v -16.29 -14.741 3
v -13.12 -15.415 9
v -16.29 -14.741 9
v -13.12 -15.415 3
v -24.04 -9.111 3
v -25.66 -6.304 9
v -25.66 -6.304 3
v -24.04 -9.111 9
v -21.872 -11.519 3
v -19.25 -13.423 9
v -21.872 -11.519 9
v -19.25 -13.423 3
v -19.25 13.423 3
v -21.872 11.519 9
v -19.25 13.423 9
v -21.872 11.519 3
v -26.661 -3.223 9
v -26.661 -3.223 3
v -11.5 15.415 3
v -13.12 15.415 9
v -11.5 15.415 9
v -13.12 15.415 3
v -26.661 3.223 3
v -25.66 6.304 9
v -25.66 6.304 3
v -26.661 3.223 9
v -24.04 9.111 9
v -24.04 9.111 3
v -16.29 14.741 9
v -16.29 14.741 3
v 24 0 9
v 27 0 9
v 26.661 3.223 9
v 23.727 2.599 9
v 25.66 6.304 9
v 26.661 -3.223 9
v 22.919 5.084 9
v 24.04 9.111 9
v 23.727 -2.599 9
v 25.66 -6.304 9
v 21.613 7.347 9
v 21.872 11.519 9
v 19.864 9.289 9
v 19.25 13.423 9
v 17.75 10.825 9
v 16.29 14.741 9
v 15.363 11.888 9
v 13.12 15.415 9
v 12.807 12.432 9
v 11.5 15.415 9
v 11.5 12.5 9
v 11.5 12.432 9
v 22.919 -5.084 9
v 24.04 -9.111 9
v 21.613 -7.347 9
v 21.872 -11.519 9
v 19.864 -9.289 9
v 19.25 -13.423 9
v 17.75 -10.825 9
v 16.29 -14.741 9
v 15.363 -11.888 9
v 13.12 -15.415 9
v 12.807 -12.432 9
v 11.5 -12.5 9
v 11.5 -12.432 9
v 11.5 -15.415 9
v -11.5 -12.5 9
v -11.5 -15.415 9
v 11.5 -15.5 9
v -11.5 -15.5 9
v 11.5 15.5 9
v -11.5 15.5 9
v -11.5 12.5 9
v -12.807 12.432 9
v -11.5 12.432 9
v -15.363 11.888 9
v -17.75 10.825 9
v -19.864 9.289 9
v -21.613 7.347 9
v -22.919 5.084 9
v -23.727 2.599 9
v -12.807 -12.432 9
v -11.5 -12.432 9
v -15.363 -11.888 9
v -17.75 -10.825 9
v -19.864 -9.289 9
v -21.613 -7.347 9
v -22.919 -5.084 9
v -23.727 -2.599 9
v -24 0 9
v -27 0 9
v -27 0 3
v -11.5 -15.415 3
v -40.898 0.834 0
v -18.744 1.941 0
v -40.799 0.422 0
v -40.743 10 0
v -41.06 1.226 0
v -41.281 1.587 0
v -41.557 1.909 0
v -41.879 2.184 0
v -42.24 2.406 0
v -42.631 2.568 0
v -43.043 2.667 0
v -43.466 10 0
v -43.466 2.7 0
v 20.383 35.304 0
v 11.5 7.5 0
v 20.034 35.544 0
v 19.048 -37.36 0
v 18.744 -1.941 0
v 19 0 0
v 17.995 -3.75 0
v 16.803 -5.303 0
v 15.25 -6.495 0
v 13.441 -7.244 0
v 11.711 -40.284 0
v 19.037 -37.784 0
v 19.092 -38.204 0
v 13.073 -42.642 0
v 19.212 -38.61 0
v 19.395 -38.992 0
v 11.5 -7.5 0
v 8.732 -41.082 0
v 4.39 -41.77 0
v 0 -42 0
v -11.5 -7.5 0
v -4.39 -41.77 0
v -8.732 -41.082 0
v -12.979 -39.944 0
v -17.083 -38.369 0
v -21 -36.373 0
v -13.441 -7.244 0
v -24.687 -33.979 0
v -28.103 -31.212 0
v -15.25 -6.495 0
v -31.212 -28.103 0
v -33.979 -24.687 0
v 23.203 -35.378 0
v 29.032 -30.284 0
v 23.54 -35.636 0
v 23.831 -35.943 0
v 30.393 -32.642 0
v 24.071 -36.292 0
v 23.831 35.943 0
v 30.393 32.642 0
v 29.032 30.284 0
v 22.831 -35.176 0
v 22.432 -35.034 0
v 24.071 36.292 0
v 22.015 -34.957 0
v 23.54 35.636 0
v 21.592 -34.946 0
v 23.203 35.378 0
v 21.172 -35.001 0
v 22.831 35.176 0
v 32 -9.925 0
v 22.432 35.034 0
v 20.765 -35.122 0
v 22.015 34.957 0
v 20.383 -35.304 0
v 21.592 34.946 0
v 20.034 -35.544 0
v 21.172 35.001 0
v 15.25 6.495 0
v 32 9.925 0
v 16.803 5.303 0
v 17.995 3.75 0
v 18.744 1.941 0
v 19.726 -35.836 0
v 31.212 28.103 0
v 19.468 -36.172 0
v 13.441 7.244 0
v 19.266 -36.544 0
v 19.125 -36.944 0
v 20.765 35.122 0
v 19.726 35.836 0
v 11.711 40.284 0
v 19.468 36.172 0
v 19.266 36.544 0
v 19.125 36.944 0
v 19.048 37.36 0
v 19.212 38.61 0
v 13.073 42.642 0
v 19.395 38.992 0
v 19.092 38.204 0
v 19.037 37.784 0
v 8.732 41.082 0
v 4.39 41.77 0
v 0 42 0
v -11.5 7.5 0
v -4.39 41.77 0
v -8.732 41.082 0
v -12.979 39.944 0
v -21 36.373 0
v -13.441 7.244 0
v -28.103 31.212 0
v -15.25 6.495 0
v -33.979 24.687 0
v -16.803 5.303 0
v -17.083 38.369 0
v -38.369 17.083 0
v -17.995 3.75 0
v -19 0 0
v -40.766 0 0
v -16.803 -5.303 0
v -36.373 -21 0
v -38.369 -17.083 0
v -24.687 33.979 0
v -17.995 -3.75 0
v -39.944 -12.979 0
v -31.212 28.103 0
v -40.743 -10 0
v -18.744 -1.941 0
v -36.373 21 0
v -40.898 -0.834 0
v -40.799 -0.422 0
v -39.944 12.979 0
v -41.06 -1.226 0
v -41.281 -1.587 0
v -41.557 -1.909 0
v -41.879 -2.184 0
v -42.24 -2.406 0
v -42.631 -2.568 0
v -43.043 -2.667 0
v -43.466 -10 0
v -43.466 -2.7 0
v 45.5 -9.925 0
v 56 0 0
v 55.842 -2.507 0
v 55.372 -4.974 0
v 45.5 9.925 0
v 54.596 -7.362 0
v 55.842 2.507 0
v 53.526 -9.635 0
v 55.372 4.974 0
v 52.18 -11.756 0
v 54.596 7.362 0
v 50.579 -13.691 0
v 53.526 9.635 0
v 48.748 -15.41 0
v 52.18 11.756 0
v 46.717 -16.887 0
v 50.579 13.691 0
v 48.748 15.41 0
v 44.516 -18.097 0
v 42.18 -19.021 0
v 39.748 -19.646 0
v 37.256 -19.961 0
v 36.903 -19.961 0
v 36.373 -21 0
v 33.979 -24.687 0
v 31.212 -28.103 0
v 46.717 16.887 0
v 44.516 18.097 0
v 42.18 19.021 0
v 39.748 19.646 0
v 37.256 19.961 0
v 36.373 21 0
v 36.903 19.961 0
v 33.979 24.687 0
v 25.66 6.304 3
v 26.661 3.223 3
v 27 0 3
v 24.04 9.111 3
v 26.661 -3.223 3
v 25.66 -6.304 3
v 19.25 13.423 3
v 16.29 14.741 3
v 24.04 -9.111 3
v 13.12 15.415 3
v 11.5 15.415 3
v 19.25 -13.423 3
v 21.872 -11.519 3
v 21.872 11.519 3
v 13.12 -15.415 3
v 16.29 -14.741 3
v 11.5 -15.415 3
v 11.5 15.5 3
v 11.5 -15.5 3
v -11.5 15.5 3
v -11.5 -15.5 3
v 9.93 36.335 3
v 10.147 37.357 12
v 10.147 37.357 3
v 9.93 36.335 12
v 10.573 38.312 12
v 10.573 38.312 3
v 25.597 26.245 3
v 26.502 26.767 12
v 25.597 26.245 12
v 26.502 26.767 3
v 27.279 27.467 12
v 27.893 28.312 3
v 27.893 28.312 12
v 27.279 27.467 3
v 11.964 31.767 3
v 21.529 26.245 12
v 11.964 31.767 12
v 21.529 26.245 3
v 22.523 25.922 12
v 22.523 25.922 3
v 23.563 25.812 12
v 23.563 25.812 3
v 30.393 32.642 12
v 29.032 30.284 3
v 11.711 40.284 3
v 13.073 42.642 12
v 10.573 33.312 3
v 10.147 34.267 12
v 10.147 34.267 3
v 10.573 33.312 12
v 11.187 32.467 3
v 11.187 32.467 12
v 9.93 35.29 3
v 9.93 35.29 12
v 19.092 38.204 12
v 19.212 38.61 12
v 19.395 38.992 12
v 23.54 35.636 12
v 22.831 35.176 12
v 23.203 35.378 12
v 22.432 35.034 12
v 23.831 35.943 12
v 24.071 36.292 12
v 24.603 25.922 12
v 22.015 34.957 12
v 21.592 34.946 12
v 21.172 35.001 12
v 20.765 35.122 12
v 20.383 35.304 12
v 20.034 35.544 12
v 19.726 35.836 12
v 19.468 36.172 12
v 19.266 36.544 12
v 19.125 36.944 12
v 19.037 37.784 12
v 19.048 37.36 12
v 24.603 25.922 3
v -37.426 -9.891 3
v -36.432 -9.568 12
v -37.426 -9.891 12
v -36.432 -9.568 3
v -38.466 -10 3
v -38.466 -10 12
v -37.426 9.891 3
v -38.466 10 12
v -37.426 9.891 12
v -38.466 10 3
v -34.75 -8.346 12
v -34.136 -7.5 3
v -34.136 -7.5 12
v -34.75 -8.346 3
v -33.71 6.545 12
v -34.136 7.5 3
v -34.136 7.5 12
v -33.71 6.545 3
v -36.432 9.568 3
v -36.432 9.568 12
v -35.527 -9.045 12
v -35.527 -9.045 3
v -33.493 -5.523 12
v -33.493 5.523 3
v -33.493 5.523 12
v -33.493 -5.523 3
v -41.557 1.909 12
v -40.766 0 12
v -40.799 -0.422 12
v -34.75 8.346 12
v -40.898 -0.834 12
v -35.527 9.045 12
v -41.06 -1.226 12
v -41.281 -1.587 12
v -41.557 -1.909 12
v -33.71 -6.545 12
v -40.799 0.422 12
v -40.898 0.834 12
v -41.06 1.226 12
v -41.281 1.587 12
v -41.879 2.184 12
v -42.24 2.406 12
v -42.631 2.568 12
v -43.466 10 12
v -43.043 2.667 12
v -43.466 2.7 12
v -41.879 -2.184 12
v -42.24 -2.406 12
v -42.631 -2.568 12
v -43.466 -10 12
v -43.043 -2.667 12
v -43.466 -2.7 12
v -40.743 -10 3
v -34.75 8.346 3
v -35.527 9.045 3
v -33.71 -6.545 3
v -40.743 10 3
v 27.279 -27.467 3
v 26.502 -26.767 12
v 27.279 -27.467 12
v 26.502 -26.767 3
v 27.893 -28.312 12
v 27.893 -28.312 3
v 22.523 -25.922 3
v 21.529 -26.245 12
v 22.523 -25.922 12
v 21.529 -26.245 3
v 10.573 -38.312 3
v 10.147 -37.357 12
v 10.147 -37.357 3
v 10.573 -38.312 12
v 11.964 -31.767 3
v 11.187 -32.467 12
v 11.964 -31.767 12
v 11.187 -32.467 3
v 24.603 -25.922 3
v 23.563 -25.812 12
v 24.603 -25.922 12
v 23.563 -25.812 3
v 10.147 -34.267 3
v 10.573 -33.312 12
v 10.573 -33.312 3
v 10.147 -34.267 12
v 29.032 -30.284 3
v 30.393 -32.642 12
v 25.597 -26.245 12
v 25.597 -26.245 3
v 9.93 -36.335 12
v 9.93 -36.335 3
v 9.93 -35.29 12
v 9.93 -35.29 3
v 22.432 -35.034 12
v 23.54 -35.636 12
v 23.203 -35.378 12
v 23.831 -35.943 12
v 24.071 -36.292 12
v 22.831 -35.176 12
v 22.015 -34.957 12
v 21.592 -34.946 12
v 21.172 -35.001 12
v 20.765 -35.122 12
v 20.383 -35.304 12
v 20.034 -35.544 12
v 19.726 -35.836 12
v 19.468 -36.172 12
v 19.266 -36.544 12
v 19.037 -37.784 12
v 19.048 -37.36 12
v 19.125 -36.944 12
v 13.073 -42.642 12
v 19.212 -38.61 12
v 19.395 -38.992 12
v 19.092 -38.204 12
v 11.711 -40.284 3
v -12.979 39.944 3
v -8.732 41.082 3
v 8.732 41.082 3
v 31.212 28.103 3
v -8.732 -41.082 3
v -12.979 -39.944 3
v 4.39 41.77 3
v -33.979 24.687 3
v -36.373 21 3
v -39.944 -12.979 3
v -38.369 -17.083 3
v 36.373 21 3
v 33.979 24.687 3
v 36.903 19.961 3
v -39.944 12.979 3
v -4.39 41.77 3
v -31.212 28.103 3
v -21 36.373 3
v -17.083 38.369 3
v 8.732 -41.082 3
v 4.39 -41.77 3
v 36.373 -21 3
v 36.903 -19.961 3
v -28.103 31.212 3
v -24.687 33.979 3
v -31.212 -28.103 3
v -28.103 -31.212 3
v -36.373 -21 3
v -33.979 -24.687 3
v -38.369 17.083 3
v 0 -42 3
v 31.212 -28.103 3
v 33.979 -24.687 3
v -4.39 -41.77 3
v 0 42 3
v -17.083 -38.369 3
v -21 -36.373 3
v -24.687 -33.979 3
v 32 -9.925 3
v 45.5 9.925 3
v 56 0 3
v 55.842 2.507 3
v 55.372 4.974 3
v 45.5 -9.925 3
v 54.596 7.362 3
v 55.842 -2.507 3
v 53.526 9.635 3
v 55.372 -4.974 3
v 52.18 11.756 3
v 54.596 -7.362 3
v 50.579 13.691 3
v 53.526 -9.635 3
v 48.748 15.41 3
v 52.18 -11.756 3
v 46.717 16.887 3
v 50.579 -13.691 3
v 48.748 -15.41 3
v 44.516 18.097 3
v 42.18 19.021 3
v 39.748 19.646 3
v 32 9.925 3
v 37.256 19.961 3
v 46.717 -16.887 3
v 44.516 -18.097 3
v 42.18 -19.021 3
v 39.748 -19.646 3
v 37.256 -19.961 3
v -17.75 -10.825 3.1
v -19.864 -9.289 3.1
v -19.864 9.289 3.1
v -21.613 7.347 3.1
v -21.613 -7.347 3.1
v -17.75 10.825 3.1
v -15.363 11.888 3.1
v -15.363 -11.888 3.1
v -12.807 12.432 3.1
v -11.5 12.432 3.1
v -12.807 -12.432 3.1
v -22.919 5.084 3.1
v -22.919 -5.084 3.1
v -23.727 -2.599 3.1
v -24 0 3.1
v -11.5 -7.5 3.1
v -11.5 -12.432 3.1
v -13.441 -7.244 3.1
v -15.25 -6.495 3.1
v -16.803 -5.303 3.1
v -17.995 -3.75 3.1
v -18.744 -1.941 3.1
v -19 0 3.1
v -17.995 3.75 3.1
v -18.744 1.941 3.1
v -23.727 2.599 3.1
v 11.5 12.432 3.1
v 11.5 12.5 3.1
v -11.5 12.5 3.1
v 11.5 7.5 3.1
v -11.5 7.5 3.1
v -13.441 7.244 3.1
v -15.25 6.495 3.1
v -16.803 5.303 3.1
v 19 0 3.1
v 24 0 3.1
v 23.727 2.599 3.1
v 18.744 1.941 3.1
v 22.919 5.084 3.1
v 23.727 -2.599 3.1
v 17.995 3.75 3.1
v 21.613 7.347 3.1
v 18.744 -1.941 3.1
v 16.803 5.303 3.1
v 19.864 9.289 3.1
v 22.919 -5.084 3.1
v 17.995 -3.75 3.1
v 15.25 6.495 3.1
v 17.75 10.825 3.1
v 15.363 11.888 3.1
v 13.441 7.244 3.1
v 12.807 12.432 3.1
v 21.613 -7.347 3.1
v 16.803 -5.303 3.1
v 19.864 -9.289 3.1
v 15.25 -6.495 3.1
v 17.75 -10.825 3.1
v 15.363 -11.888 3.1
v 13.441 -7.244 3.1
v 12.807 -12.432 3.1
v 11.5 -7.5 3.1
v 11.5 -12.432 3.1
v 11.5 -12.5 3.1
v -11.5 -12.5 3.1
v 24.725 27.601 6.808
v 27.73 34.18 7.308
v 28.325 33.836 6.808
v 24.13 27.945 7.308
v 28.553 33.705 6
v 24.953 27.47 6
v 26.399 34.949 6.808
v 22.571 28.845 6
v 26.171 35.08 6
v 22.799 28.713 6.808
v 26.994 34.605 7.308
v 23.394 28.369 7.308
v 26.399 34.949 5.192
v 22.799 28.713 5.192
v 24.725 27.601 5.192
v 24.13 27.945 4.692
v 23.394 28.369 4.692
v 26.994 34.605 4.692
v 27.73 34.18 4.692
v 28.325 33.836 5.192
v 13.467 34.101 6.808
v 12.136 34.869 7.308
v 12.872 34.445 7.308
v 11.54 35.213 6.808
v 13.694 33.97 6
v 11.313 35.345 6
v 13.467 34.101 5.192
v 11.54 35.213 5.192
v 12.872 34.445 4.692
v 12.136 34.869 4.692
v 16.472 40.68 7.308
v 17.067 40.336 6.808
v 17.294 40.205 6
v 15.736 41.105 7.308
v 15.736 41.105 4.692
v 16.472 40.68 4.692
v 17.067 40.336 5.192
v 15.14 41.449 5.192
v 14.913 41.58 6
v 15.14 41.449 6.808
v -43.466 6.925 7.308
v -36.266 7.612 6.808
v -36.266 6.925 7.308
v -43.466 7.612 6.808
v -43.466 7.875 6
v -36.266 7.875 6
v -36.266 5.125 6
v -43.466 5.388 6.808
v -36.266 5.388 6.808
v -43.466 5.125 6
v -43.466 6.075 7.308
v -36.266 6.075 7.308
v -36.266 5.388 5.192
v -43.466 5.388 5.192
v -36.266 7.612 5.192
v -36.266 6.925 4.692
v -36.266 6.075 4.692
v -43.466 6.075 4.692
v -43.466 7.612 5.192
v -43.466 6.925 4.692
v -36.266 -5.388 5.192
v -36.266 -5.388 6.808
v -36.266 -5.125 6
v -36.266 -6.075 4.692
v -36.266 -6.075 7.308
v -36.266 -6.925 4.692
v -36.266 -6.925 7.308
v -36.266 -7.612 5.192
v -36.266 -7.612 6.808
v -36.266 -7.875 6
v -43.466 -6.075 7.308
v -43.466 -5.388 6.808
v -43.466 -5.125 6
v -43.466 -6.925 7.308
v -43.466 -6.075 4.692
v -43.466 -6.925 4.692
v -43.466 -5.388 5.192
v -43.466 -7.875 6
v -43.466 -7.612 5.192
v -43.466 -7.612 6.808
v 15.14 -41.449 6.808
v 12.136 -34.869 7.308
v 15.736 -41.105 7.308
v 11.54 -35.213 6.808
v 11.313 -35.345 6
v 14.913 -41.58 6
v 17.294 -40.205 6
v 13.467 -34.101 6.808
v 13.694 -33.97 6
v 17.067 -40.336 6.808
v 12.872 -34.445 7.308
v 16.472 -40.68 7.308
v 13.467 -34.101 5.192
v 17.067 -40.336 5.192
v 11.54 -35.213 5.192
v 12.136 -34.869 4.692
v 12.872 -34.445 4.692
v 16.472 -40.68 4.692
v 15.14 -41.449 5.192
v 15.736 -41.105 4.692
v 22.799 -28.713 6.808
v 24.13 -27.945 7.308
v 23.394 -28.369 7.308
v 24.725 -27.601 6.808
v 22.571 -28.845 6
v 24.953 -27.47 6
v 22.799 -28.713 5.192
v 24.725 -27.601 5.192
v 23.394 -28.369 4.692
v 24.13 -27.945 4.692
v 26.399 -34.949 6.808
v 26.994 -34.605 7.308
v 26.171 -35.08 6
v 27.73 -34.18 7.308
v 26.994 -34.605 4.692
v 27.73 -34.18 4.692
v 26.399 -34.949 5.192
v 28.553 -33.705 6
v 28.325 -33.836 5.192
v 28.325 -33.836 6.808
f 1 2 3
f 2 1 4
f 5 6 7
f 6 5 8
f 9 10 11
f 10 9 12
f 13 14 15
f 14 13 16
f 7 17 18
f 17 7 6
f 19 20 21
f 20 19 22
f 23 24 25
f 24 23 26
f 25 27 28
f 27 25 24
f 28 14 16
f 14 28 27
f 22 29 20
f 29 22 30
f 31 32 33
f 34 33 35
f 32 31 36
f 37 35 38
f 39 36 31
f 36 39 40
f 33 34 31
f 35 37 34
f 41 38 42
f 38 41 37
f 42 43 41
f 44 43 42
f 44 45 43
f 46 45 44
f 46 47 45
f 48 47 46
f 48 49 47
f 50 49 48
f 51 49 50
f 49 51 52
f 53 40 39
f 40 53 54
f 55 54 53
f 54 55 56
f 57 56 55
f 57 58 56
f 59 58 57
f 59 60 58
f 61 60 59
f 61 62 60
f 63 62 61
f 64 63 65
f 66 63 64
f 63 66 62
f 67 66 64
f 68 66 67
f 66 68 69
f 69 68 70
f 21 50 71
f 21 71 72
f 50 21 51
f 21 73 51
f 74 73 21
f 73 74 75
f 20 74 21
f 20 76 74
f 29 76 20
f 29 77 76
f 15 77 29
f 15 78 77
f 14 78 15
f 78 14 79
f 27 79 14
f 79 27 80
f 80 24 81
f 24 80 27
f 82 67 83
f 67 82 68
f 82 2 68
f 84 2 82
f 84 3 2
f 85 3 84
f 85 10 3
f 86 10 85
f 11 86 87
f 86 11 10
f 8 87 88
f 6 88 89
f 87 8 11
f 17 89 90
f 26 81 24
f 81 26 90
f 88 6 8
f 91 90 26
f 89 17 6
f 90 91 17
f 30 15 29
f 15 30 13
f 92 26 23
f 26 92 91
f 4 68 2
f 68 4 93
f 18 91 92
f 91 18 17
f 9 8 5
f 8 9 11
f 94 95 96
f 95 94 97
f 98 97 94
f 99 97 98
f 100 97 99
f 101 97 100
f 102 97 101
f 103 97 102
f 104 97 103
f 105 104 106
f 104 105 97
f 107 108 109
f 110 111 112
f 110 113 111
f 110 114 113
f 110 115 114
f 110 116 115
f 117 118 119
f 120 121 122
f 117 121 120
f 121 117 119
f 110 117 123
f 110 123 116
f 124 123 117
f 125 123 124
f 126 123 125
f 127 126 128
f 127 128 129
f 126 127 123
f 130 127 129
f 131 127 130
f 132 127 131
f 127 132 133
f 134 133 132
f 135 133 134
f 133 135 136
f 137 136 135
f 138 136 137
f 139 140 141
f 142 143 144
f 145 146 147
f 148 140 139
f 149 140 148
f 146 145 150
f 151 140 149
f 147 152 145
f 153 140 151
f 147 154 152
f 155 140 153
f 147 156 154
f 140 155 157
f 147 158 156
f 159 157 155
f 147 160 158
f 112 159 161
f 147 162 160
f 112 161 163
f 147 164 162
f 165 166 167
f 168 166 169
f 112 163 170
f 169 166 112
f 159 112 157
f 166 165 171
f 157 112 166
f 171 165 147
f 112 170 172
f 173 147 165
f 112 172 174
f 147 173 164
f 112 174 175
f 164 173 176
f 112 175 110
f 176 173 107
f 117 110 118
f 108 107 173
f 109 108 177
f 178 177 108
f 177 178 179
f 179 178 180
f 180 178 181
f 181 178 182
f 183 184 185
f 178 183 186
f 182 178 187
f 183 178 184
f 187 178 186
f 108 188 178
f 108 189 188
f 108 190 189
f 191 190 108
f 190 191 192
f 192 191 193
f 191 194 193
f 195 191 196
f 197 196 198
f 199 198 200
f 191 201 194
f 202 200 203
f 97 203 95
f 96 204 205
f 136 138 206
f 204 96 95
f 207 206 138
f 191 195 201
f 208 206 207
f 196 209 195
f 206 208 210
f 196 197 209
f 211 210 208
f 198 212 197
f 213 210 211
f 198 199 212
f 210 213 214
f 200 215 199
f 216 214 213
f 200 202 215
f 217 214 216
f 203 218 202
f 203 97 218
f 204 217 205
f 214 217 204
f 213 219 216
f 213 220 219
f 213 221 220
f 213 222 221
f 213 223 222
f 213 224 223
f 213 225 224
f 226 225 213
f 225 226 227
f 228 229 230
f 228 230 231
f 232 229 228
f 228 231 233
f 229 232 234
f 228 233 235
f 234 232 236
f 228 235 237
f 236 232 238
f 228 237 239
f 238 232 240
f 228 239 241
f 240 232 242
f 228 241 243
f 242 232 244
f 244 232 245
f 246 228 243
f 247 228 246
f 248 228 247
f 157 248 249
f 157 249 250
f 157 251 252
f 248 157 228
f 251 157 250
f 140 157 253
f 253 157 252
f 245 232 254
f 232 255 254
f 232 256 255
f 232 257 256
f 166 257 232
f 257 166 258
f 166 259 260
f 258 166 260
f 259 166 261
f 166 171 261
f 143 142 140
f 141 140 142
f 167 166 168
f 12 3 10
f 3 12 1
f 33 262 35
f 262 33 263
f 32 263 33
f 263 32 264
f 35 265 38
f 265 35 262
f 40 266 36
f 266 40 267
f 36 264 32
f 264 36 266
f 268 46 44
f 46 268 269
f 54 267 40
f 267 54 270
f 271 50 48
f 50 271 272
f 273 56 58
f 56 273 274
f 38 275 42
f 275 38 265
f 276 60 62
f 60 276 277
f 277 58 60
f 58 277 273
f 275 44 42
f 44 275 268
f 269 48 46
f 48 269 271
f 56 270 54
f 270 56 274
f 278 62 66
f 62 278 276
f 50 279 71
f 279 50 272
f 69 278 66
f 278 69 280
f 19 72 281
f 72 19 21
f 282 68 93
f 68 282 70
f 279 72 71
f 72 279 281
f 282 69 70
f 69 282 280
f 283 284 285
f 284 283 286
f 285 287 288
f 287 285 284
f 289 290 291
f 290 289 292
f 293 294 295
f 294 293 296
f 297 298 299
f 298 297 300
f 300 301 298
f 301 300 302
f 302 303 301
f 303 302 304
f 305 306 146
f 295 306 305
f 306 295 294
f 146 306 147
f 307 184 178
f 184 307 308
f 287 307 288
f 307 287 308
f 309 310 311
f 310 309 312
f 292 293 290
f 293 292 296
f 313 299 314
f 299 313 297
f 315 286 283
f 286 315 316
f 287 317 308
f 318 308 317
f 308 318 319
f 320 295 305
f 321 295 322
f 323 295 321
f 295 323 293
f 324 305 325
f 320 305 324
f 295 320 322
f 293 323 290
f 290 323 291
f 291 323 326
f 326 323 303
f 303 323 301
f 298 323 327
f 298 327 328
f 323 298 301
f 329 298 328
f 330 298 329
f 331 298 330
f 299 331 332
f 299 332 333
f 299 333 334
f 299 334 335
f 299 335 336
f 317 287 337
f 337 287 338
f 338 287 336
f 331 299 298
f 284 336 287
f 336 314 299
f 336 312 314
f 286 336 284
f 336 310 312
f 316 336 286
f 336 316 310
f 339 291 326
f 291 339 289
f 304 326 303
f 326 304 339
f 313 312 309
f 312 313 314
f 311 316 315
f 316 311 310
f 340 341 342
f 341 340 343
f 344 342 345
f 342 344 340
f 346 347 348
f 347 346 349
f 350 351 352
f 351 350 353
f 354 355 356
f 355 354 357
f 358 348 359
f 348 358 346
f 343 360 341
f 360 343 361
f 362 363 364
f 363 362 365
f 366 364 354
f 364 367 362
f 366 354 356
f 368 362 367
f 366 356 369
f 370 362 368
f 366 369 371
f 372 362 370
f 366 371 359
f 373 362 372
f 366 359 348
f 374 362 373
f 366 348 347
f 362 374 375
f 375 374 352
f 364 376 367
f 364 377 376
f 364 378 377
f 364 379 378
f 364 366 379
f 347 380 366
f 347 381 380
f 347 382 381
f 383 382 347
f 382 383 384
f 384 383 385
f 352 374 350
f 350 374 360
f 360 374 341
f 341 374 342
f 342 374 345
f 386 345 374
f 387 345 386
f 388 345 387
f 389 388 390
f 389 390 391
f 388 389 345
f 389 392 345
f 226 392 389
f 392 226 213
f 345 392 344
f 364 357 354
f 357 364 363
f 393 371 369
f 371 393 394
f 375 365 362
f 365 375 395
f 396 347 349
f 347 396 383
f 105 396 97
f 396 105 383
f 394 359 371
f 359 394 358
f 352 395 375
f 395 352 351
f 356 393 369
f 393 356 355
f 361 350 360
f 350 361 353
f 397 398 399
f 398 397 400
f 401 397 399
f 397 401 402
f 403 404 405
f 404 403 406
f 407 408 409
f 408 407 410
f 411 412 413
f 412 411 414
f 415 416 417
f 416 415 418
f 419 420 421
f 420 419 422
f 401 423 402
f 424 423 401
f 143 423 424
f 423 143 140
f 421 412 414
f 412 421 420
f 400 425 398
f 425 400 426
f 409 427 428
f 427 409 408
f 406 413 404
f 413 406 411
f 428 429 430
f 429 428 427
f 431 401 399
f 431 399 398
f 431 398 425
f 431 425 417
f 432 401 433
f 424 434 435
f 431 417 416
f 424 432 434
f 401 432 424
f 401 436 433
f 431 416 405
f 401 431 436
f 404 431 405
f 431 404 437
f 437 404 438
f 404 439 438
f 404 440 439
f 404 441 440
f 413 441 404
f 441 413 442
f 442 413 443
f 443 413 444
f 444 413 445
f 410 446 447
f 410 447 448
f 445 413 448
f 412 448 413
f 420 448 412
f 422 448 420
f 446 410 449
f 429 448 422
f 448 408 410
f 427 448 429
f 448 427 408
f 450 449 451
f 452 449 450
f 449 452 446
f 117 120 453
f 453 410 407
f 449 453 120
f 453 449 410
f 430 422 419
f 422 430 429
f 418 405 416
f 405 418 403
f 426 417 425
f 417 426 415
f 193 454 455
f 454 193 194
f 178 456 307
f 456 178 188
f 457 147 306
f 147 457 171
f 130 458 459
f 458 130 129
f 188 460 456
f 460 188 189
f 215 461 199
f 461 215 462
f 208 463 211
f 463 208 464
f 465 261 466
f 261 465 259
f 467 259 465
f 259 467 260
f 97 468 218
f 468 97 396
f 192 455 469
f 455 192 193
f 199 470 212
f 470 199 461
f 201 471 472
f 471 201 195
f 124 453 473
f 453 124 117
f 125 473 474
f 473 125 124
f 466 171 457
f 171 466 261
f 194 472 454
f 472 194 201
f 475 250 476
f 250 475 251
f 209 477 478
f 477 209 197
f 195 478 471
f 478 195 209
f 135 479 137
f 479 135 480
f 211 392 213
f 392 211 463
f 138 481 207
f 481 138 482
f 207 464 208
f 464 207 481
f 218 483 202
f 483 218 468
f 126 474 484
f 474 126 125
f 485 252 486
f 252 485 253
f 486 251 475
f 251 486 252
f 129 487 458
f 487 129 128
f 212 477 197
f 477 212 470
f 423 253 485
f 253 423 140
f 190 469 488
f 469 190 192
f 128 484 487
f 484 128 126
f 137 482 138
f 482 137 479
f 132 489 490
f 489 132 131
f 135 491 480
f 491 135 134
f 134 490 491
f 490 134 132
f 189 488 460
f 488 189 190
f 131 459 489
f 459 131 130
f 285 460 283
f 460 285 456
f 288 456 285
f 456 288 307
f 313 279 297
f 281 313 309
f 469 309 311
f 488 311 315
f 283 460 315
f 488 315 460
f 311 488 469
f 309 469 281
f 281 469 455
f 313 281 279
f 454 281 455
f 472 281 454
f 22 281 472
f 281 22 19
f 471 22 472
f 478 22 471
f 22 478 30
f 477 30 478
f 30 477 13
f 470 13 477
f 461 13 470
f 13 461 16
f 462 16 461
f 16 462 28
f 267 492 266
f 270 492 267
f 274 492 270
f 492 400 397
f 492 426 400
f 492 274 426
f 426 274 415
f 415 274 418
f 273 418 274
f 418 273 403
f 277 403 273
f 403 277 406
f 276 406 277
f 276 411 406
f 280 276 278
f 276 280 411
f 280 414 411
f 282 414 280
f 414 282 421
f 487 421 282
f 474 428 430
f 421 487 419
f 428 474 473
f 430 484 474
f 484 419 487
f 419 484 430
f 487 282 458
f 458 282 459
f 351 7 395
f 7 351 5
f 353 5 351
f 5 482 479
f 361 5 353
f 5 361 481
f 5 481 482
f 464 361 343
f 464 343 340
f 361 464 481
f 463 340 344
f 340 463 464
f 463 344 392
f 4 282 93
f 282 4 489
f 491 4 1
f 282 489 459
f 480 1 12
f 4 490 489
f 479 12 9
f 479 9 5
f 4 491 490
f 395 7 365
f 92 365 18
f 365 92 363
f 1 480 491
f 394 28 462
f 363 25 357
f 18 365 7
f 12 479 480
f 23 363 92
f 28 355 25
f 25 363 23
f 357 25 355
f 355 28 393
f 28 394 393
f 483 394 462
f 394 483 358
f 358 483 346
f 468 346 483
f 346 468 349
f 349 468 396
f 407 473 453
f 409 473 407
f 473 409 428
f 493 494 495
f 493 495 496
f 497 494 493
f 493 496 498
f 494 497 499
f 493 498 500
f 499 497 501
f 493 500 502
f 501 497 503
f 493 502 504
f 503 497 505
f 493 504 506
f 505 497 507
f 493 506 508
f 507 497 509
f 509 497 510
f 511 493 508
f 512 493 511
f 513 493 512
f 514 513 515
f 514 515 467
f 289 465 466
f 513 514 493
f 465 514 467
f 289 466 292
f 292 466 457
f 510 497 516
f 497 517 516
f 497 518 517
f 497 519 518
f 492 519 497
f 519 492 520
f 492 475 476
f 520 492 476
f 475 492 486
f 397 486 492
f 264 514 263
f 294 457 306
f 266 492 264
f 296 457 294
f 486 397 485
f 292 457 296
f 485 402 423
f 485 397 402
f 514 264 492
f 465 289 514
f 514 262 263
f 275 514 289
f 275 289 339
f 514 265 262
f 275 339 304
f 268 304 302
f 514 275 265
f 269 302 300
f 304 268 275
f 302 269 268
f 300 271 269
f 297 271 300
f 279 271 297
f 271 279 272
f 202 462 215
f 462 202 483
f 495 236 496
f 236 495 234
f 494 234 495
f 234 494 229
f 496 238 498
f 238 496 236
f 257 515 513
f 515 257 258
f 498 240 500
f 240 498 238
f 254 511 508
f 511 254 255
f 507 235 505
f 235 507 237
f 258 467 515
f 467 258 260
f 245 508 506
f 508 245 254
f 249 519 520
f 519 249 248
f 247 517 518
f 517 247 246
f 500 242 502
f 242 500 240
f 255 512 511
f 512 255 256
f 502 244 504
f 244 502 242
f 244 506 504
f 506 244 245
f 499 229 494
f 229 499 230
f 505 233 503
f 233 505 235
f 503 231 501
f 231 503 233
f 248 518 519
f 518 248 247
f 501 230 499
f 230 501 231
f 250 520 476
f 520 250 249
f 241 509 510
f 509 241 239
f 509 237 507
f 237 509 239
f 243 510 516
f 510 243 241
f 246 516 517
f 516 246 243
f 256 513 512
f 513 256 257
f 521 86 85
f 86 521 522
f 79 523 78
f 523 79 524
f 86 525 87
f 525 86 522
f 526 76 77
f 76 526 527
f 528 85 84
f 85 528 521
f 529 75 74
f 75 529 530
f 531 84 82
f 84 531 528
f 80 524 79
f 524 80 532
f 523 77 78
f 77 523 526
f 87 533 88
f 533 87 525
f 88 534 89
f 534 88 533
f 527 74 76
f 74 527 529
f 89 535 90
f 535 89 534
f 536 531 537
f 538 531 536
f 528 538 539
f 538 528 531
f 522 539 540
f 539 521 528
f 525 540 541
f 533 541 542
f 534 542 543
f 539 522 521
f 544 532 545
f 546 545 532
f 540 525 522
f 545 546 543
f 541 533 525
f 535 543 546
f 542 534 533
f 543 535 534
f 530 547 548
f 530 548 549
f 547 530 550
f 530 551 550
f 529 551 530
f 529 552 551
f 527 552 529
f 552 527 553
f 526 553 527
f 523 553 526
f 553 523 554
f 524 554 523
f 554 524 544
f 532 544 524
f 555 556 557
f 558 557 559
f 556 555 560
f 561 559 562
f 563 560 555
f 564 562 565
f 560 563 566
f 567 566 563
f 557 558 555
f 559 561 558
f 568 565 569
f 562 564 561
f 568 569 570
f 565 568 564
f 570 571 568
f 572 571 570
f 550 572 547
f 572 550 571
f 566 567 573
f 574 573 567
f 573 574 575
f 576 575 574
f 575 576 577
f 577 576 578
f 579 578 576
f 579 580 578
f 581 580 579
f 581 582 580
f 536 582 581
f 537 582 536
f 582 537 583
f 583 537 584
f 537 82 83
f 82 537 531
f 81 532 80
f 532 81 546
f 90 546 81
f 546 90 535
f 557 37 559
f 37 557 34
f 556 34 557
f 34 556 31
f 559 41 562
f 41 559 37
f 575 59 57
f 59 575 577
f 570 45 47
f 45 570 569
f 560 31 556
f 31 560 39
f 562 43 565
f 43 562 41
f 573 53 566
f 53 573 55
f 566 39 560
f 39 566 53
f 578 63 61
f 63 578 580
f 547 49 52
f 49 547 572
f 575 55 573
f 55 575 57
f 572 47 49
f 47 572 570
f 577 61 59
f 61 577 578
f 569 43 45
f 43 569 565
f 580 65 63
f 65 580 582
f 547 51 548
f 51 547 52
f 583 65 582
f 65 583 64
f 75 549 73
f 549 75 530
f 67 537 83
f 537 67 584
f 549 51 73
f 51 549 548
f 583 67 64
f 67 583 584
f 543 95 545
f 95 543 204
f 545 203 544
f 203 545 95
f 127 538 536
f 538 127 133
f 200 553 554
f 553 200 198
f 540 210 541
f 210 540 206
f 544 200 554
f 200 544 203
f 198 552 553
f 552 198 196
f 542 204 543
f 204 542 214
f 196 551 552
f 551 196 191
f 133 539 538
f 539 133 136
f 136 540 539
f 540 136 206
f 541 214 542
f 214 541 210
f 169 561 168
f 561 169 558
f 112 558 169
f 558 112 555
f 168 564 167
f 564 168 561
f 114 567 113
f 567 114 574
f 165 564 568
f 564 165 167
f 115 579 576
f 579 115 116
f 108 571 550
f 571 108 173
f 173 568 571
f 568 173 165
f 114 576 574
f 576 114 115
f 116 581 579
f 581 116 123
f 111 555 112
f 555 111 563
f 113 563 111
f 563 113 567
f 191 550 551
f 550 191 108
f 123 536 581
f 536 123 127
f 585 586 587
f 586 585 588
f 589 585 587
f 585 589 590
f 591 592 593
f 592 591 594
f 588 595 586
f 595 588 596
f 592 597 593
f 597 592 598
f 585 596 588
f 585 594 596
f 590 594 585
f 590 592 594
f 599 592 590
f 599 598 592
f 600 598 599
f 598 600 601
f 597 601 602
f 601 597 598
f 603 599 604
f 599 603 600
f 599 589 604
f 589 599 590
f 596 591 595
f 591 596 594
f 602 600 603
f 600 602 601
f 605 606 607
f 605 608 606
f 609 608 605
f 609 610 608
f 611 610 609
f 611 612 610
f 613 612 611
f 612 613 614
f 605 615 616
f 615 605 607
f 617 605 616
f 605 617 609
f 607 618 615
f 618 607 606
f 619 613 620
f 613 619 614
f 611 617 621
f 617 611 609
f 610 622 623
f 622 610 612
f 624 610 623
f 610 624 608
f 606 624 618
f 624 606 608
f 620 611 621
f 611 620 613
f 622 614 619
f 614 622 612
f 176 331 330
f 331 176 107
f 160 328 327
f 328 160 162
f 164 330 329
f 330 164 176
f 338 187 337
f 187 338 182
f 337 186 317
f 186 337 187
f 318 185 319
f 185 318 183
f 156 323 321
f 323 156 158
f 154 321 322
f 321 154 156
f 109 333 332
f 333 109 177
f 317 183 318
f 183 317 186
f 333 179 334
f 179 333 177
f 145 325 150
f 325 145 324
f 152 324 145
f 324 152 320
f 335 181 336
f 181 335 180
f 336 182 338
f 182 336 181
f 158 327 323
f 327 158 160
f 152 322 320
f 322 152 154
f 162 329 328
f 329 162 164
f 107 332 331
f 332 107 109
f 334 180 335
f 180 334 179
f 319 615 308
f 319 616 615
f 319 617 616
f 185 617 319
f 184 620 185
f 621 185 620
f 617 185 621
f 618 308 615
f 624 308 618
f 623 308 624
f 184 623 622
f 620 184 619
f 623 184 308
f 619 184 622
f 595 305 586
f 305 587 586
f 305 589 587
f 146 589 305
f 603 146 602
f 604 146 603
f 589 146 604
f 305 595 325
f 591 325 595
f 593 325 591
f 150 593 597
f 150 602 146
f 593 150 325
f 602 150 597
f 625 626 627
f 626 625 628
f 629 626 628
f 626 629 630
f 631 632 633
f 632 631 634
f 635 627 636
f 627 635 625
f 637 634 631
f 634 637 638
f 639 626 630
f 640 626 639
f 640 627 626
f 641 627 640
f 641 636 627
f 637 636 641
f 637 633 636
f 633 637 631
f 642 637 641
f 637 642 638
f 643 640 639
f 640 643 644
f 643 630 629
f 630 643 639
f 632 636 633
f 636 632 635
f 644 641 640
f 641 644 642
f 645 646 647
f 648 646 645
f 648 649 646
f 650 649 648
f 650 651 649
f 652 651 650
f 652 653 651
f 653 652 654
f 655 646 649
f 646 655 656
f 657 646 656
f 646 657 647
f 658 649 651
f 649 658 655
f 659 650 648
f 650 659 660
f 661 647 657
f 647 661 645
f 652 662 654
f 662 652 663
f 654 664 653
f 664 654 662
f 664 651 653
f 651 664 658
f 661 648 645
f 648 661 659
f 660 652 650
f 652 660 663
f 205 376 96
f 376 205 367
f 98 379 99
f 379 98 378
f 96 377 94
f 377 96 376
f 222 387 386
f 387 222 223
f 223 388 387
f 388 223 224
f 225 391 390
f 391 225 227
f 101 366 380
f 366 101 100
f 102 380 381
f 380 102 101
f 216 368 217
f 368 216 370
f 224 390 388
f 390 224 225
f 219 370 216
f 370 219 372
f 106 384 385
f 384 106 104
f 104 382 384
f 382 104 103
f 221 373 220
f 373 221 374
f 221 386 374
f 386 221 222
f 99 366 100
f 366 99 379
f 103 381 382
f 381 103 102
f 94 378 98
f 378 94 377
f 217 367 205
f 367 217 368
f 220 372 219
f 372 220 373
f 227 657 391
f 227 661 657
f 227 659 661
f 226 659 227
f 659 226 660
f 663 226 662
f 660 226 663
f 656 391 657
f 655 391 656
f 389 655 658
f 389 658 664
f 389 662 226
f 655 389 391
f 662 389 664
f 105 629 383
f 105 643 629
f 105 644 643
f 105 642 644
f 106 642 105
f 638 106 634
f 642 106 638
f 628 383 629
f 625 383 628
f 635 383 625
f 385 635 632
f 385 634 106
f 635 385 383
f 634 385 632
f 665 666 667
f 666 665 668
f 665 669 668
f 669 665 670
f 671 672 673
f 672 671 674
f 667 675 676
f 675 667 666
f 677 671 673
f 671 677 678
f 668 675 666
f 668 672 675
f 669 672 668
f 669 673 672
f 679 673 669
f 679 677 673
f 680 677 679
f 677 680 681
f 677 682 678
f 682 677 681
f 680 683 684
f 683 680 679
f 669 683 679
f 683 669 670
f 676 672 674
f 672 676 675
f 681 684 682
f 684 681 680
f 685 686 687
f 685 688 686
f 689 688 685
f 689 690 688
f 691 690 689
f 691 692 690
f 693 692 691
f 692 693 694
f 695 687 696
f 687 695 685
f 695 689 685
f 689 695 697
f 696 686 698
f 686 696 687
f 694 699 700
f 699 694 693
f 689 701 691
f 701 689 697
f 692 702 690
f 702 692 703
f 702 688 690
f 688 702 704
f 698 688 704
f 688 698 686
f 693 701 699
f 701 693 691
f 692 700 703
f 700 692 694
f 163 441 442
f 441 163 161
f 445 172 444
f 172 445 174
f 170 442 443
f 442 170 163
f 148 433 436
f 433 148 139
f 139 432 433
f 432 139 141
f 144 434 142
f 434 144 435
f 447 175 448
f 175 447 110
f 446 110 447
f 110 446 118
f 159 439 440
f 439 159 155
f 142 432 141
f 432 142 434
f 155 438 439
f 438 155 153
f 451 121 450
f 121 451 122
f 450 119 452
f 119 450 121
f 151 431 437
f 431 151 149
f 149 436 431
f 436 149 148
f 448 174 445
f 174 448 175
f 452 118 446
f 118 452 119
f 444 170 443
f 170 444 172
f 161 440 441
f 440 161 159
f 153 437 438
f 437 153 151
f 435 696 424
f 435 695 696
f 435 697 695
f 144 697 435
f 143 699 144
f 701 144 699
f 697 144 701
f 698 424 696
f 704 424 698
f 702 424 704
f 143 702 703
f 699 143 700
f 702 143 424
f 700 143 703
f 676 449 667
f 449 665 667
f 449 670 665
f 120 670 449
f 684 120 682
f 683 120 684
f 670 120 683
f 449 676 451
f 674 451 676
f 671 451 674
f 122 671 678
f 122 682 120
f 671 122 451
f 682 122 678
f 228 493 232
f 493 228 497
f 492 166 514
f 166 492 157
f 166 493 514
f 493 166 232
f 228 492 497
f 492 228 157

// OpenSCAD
// file: lib/stepper.scad
smWidth = 42;
smLength = 40;
smScrewHoleOffsets = 31/2;
smCenterDiameter = 22;
smExtra = 1;

module stepperMotor() {
    smCenterHeight = 2;
    smShaftDiameter = 5;
    smShaftLength = 23;
    smScrewDepth = 4.5;
    smScrewDiameter = 3;
    smEdgeTrimOffset = 27;
    module add() {
        translate([-smWidth/2, -smLength, -smWidth/2]) {
            cube([smWidth, smLength, smWidth]);
        }
        rotate([-90, 0, 0]) {
            cylinder(d=smCenterDiameter, h=smCenterHeight, $fn=30);
            cylinder(d=smShaftDiameter, h=smShaftLength, $fn=20);
        }
    }
    module del() {
        for (x = [smScrewHoleOffsets, -smScrewHoleOffsets]) {
            for (z = [smScrewHoleOffsets, -smScrewHoleOffsets]) {
                translate([x, iota, z]) {
                    rotate([90, 0, 0]) {
                        cylinder(d=smScrewDiameter, h=smScrewDepth, $fn=40);
                    }
                }
            }
        }
        for (a = [45, 135, 225, 315]) {
            rotate([0, a, 0]) {
                translate([smEdgeTrimOffset,
                        -smLength-iota, -smWidth/2-iota]) {
                    cube([smWidth, smLength+2*iota, smWidth+2*iota]);
                }
            }
        }

    }
    difference() {
        add();
        del();
    }
}

module stepperMotorHole() {
    smHoleHeight = 20;
    smScrewHoleDiameter = 4;

    widthPlusExtra = smWidth + smExtra;
    lengthPlusExtra = smLength + smExtra/2;

    translate([-smWidth/2, -lengthPlusExtra, -widthPlusExtra/2]) {
        cube([smWidth, lengthPlusExtra, widthPlusExtra]);
    }
    translate([0, -iota, 0]) {
        rotate([-90, 0, 0]) {
            cylinder(d=smCenterDiameter+smExtra, h=smHoleHeight, $fn=40);
        }
    }
    for (x = [smScrewHoleOffsets, -smScrewHoleOffsets]) {
        for (z = [smScrewHoleOffsets, -smScrewHoleOffsets]) {
            translate([x, smHoleHeight-iota, z]) {
                rotate([90, 0, 0]) {
                    cylinder(d=smScrewHoleDiameter, h=smHoleHeight, $fn=40);
                }
            }
        }
    }

}
// file: lib/commonConstants.scad
// A small quantity to keep parts from starting or ending at exactly the
// same location. For example when we create a hole through an object we
// want the object being subtracted to stick slightly past the object being
// subtracted from.
iota = 0.1;


// Length and hole diameter of the #4 x 3/8in Phillips mount screw.
screwLength = 9.3;
screwHoleDiameter = 2.75;
screwHeadDiameter = 6.5;
screwBodyDiameter = 3.4;


// These constants are the basic parameters of the mount plate. They are
// necessary for other components to make their calculations.
mountPlateWidth = 37.6;
mountPlateLength = 51;


// These constants are the basis for the carbon fiber mount points. They are
// necessary for other components to make their calculations.
mountRodDiameter = 5.5;         // A little extra because holes are smaller.
mountThickness = 9;
mountDiameter = mountRodDiameter + 2*mountThickness;


// These constasnts are teh basis for the motor base. They are necessary for
// other components to make their calculations.
motorBaseExtraAxisOffset = 5;
motorBaseTopOffset = sqrt(3)*mountPlateWidth/6 + motorBaseExtraAxisOffset;
motorBaseBottomOffset = mountPlateLength/sqrt(2) + motorBaseTopOffset;
motorBaseBottomRadius = sqrt(pow(motorBaseBottomOffset,2) +
                             pow(mountPlateWidth/2, 2));
mountBaseRodOffsets = motorBaseBottomRadius-mountDiameter/2;
// main file
include <lib/commonConstants.scad>;
include <lib/stepper.scad>;
include <lib/commonMounts.scad>;

batteryBottomMount();
